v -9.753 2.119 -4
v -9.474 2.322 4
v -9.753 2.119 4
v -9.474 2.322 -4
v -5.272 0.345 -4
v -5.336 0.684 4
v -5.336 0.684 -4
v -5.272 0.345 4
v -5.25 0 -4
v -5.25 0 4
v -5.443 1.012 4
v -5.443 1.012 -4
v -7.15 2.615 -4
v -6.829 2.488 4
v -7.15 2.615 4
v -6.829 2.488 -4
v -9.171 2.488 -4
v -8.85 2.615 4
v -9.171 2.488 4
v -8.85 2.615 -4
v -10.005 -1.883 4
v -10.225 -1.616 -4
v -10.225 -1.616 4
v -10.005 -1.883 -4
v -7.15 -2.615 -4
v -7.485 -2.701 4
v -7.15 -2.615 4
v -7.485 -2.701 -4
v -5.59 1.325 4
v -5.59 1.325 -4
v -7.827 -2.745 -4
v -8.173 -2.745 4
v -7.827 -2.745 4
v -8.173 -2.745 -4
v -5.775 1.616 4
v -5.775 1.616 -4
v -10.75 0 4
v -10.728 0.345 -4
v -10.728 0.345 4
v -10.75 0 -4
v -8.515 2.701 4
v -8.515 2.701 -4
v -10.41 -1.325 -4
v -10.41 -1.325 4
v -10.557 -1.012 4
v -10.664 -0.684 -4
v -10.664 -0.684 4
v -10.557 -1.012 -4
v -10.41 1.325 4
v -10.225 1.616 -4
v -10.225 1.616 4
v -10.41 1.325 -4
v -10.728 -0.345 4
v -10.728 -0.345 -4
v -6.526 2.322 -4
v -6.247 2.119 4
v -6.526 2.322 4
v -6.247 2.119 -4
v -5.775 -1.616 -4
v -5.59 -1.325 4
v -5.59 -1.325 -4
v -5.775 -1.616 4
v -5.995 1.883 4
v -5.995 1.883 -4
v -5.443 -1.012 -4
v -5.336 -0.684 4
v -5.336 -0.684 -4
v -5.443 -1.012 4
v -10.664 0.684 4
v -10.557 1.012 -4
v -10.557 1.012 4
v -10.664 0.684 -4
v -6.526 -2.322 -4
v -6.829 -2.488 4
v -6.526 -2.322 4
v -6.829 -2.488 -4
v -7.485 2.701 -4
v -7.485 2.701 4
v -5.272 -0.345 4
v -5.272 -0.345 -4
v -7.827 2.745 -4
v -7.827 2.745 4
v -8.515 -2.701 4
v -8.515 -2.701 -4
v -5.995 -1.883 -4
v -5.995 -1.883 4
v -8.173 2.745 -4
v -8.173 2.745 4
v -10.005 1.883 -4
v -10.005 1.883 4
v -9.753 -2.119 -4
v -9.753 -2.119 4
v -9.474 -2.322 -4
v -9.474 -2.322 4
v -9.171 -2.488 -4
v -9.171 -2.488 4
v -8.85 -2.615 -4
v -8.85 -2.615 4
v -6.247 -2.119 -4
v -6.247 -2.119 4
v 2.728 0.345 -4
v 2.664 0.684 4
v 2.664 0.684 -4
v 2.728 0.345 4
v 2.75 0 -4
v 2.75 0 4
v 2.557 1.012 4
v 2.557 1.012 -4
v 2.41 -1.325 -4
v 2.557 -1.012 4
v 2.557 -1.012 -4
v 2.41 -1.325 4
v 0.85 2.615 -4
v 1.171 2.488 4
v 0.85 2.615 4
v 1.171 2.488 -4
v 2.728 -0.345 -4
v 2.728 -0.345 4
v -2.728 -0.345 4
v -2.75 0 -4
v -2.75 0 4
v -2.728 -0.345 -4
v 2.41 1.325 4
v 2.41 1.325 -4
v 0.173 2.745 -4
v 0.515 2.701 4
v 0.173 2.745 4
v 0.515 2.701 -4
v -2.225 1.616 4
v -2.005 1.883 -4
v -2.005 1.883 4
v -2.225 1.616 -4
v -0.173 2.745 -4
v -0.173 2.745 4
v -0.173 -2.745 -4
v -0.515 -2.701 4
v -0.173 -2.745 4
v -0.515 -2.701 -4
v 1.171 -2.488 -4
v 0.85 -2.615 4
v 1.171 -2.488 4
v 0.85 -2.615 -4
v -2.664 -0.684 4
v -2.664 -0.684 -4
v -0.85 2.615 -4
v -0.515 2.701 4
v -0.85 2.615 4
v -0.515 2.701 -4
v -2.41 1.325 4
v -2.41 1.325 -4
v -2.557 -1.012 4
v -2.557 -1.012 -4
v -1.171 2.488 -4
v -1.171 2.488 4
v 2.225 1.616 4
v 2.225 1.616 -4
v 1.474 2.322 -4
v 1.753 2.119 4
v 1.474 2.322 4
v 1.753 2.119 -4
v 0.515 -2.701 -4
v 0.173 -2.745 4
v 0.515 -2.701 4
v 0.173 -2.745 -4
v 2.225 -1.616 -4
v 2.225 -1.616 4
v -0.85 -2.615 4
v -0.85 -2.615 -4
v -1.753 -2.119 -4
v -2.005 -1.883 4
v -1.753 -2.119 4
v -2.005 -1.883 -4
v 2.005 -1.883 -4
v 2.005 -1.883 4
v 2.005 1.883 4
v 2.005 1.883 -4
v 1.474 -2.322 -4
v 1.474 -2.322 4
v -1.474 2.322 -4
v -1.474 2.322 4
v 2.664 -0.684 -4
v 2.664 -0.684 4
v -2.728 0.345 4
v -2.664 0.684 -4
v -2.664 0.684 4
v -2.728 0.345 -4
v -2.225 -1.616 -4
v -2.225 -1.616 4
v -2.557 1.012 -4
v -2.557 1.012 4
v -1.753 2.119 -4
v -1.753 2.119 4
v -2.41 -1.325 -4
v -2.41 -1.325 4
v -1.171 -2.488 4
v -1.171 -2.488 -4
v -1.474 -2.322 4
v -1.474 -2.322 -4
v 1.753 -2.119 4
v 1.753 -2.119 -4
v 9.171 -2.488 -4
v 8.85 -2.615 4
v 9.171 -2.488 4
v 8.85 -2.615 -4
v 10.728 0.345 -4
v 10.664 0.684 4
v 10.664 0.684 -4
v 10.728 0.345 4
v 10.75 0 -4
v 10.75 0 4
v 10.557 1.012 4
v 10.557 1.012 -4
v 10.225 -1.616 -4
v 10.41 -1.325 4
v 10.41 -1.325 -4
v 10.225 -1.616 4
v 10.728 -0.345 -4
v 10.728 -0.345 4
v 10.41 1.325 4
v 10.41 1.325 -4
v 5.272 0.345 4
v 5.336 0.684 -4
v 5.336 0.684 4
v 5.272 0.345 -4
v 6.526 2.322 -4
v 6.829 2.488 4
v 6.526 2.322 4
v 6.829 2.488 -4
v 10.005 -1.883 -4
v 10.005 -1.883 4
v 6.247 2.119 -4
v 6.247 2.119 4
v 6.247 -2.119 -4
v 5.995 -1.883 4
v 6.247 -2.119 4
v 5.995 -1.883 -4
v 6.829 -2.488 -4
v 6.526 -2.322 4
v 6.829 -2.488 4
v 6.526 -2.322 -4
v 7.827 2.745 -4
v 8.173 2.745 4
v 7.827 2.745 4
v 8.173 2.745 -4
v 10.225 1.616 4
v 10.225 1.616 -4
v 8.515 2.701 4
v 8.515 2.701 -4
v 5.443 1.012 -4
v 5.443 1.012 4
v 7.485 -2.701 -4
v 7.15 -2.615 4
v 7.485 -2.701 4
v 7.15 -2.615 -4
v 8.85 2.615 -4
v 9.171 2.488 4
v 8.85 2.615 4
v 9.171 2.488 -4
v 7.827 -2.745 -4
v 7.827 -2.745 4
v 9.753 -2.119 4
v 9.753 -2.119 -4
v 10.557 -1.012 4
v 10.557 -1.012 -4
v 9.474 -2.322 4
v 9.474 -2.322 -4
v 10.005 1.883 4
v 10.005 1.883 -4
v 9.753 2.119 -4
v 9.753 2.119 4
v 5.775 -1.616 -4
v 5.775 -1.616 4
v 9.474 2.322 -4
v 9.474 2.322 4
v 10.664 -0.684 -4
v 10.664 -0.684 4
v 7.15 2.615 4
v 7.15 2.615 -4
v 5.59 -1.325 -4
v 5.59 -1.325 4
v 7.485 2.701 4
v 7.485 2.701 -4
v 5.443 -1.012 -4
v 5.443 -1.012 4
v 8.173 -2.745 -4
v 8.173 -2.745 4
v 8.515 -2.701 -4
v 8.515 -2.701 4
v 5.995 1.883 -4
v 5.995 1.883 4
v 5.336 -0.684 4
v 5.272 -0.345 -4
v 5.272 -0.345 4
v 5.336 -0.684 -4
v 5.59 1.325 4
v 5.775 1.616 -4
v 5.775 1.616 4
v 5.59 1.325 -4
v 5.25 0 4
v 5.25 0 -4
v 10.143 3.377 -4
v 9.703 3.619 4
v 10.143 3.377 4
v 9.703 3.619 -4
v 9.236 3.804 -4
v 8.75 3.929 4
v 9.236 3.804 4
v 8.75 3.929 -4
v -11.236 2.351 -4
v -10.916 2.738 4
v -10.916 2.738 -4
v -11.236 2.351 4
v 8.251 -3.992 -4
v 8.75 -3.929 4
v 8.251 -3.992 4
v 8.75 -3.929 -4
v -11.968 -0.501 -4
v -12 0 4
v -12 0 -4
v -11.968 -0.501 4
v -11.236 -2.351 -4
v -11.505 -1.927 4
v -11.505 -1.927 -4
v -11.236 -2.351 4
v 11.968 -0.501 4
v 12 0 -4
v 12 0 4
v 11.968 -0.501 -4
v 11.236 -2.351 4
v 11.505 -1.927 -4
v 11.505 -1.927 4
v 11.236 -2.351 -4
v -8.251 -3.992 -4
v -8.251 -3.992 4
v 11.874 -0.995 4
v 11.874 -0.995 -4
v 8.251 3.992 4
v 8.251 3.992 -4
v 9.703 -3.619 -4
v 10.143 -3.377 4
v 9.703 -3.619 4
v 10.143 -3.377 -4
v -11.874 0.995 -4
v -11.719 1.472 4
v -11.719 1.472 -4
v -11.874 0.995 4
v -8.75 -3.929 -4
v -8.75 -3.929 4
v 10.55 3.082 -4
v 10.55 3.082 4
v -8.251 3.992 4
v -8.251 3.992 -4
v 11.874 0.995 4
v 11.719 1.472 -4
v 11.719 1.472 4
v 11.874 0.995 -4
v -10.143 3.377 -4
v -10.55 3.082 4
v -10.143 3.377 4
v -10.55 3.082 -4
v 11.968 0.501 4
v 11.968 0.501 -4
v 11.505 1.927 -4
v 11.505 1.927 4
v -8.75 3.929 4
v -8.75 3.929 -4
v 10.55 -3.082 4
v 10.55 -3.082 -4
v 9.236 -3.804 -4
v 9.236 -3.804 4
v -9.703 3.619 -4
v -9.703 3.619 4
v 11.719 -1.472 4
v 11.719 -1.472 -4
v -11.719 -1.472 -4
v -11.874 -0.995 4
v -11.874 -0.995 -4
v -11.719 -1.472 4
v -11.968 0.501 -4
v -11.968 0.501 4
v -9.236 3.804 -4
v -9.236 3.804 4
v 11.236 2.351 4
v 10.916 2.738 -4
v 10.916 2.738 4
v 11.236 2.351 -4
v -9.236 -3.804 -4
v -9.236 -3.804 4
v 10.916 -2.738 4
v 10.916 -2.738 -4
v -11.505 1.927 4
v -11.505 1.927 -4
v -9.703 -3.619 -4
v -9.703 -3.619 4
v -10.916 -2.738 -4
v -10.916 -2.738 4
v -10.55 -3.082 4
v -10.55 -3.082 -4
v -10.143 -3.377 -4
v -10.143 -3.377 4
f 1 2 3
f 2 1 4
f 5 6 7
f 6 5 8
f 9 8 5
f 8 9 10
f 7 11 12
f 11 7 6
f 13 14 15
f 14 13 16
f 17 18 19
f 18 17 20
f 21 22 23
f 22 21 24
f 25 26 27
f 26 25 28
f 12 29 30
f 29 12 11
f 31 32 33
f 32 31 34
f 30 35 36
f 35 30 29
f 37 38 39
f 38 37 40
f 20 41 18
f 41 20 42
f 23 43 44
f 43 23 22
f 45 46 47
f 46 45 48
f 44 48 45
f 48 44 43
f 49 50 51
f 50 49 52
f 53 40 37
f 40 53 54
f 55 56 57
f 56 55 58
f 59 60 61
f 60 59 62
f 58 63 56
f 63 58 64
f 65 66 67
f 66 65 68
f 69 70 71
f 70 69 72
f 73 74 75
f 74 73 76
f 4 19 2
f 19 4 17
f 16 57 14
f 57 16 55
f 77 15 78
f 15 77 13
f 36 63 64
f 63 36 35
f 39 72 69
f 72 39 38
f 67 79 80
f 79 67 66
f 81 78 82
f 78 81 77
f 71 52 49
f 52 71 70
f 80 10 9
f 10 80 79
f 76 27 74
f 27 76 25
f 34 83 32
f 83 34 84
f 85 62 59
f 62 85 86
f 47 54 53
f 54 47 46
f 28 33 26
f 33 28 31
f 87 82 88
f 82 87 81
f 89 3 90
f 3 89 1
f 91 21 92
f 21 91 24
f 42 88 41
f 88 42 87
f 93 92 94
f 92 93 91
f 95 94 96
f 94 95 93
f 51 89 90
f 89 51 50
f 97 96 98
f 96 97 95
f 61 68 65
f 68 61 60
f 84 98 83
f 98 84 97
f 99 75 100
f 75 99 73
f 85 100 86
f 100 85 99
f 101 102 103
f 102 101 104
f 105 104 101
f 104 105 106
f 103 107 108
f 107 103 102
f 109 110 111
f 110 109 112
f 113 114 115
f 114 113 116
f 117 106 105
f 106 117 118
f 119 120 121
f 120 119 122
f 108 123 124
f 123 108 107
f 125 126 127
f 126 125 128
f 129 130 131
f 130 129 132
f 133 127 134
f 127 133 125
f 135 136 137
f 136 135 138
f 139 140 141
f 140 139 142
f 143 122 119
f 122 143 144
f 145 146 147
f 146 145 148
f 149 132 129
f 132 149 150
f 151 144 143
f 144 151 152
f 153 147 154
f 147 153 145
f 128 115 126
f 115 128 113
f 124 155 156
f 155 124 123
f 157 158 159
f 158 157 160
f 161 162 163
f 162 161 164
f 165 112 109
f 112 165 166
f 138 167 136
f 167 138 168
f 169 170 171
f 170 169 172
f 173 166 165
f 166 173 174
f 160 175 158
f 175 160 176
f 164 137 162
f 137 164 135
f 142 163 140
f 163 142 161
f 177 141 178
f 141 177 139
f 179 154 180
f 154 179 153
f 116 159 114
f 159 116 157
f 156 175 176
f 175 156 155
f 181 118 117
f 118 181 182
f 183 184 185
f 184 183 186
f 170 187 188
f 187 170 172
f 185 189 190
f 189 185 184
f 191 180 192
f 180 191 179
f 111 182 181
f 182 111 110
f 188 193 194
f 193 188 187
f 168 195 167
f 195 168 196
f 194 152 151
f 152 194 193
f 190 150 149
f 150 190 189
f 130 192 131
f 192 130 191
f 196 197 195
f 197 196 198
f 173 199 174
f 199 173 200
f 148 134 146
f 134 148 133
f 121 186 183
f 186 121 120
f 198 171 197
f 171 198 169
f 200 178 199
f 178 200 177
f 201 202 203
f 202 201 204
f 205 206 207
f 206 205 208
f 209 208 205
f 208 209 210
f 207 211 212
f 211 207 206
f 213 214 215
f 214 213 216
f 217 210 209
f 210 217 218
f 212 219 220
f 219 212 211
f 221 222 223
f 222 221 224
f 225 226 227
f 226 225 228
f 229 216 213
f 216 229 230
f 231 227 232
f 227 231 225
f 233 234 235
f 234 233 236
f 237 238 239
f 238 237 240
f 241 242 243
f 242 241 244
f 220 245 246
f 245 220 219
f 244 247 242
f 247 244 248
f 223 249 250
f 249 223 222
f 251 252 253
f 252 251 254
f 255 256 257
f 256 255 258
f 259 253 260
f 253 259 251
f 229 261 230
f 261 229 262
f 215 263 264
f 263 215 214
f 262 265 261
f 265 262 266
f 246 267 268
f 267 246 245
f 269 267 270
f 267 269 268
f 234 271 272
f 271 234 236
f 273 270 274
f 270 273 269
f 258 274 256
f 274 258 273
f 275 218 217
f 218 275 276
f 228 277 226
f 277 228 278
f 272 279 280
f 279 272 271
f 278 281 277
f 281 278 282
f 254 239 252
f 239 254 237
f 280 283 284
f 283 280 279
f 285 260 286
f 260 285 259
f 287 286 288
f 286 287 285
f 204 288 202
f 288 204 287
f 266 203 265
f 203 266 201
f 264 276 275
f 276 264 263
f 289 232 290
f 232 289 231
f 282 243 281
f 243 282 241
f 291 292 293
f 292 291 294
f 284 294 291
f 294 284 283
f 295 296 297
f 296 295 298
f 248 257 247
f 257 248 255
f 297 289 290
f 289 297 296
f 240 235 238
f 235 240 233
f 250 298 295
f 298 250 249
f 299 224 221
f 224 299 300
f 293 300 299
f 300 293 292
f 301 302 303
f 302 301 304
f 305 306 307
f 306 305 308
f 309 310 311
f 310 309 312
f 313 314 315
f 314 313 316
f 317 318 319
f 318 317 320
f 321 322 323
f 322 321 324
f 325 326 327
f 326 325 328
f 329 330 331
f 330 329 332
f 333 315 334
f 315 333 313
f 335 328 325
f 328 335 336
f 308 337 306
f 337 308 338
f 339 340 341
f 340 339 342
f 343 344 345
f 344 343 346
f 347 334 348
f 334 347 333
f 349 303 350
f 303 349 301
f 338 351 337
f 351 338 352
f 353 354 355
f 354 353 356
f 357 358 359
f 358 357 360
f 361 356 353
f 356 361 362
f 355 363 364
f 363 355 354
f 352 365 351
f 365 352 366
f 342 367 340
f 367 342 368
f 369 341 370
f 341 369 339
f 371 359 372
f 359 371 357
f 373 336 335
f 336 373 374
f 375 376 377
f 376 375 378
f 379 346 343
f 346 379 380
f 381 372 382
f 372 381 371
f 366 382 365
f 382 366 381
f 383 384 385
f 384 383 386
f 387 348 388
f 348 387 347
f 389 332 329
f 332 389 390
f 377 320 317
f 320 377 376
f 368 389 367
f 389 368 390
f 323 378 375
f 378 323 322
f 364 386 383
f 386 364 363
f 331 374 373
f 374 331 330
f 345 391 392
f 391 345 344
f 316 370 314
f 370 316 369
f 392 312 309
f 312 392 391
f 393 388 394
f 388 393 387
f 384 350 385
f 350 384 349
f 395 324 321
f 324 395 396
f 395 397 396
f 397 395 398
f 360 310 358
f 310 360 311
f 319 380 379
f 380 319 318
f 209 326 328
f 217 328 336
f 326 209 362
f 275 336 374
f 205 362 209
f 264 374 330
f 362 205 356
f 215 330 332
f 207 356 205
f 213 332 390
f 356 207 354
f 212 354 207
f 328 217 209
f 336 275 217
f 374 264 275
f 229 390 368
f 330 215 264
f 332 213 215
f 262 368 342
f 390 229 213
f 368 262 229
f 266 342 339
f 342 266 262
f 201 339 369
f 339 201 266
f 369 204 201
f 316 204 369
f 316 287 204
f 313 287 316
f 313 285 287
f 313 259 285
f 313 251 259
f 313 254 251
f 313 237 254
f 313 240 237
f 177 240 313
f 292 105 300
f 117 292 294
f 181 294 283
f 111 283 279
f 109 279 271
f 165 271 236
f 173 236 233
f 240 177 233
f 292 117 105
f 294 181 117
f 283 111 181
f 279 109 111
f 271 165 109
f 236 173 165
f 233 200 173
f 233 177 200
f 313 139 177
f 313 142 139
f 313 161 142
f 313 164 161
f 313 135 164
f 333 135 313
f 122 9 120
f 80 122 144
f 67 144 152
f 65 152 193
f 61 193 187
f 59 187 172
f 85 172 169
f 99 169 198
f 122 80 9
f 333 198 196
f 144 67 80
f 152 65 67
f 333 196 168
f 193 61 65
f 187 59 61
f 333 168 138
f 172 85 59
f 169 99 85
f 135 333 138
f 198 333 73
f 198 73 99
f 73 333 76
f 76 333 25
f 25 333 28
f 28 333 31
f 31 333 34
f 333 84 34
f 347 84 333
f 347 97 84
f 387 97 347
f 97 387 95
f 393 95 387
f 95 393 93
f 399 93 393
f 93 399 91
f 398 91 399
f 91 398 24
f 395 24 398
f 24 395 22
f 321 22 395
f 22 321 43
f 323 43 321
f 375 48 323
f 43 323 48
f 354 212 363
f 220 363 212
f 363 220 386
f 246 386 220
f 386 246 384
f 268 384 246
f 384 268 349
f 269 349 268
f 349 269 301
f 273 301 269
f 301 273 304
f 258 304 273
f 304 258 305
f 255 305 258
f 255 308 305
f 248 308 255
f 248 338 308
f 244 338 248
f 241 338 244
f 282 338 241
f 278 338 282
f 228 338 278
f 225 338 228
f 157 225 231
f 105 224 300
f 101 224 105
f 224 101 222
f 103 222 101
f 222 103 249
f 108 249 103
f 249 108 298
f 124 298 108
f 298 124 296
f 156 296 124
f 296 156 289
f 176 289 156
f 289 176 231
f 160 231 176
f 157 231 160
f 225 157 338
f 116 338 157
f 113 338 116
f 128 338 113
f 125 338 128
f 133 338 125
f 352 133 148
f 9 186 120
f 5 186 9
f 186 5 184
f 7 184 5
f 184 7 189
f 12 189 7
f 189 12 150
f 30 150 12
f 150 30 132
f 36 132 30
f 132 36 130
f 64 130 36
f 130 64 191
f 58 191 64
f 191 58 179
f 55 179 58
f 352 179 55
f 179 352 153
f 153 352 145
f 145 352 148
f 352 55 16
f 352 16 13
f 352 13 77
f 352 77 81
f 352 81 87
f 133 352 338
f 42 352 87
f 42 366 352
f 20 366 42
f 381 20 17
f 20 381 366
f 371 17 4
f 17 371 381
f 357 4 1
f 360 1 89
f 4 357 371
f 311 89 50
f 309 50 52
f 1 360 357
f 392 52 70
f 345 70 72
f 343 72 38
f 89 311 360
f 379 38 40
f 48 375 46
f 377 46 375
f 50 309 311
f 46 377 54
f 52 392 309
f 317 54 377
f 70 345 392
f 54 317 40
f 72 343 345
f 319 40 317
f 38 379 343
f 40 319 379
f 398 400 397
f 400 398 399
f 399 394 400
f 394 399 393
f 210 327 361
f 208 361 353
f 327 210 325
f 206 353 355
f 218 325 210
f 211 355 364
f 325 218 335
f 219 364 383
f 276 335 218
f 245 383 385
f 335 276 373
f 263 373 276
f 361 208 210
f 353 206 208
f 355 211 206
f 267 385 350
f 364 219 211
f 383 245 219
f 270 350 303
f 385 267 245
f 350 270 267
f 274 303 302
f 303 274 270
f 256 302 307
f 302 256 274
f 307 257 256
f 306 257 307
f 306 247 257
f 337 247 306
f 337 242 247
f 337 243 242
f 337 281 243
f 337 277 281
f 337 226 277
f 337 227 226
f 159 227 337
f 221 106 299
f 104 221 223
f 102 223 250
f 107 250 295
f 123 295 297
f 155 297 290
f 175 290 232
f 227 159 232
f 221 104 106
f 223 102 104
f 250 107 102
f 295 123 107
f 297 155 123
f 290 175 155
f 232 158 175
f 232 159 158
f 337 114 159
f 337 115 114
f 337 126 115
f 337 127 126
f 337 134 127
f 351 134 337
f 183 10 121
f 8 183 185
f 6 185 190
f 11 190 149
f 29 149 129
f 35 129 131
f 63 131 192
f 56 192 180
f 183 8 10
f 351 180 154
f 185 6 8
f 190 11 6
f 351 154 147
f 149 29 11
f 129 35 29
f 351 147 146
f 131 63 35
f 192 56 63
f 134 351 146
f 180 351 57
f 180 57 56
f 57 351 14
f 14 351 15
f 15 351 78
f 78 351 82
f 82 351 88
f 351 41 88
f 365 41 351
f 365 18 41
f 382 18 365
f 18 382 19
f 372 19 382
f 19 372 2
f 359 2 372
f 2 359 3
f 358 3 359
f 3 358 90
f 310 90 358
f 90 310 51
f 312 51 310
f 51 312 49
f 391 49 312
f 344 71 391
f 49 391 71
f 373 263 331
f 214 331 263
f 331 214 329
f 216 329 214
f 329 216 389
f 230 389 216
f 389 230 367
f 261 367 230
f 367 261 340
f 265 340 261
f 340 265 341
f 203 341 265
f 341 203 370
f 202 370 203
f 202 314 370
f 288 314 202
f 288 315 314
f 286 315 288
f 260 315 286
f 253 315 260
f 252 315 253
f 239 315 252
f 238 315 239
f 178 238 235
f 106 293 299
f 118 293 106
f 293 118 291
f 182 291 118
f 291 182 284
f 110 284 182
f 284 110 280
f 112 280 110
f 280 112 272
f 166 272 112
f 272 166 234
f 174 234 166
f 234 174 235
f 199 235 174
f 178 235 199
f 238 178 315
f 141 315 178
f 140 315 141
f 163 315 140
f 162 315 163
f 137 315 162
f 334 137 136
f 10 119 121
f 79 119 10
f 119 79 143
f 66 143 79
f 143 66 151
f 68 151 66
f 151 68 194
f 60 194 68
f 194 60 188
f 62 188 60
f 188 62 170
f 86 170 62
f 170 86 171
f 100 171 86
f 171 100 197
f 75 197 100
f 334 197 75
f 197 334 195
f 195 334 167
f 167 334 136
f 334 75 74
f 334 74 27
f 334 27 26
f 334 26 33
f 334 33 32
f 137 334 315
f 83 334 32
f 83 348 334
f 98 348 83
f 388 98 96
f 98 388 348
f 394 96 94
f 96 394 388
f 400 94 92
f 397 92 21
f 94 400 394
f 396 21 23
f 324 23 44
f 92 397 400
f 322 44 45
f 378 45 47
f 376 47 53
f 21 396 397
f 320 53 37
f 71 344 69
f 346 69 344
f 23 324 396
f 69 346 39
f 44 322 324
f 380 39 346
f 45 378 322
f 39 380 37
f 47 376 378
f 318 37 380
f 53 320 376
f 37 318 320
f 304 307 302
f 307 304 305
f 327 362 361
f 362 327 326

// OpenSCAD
// User parameters
drool = 0.3; // Extra material to account for 3D printing inaccuracies
beam_length_units = 3; // Beam length in LEGO units (1 unit = 8mm)

// Parameter definitions
technic_hole_diameter = 4.9; // Diameter for Technic pin holes, adjusted for 3D printing
beam_width = 8; // Standard Technic beam width
beam_height = 8; // Standard Technic beam height
round_radius = beam_width / 2; // Radius for the rounded ends, typically half the beam width

// Module for a LEGO Technic pin hole
// Diameter adjusted for 3D printing (e.g., 4.9 mm)
module technic_hole() {
  cylinder(d = technic_hole_diameter + 2*drool, h = beam_height + 2, $fn = 50, center = true); 
}

// Module for a LEGO Technic beam with rounded ends, centered at the origin
// The length is in LEGO units (1 unit = 8mm)
module technic_beam(length_units) {
  // We check if the beam is long enough to have a central linear part
  if (length_units > 1) {
    // Length of the central rectangular part of the beam
    linear_part_length = (length_units * 8) - beam_width; 

    // Use hull() to create the rounded shape
    hull() {
      // Cylinder for the first rounded end (left side)
      translate([-linear_part_length / 2, 0, 0])
        cylinder(r = round_radius, h = beam_height, $fn = 50, center = true);

      // Cylinder for the second rounded end (right side)
      translate([linear_part_length / 2, 0, 0])
        cylinder(r = round_radius, h = beam_height, $fn = 50, center = true);
    }
  } else {
    // For a 1-unit beam, it's just a single cylinder
    cylinder(r = round_radius, h = beam_height, $fn = 50, center = true);
  }
}

// Final part creation
difference() {
  // 1. The base beam, now properly centered at the origin
  technic_beam(beam_length_units);

  // 2. Drilling the holes in a loop
  for (i = [0 : beam_length_units - 1]) {
    // Position of each hole, relative to the beam's center
    // We adjust the x-position to get to the first hole, then add 8mm for each subsequent hole
    translate([ -((beam_length_units - 1) * 8) / 2 + (i * 8), 0, 0]) 
      technic_hole();
  }
}
